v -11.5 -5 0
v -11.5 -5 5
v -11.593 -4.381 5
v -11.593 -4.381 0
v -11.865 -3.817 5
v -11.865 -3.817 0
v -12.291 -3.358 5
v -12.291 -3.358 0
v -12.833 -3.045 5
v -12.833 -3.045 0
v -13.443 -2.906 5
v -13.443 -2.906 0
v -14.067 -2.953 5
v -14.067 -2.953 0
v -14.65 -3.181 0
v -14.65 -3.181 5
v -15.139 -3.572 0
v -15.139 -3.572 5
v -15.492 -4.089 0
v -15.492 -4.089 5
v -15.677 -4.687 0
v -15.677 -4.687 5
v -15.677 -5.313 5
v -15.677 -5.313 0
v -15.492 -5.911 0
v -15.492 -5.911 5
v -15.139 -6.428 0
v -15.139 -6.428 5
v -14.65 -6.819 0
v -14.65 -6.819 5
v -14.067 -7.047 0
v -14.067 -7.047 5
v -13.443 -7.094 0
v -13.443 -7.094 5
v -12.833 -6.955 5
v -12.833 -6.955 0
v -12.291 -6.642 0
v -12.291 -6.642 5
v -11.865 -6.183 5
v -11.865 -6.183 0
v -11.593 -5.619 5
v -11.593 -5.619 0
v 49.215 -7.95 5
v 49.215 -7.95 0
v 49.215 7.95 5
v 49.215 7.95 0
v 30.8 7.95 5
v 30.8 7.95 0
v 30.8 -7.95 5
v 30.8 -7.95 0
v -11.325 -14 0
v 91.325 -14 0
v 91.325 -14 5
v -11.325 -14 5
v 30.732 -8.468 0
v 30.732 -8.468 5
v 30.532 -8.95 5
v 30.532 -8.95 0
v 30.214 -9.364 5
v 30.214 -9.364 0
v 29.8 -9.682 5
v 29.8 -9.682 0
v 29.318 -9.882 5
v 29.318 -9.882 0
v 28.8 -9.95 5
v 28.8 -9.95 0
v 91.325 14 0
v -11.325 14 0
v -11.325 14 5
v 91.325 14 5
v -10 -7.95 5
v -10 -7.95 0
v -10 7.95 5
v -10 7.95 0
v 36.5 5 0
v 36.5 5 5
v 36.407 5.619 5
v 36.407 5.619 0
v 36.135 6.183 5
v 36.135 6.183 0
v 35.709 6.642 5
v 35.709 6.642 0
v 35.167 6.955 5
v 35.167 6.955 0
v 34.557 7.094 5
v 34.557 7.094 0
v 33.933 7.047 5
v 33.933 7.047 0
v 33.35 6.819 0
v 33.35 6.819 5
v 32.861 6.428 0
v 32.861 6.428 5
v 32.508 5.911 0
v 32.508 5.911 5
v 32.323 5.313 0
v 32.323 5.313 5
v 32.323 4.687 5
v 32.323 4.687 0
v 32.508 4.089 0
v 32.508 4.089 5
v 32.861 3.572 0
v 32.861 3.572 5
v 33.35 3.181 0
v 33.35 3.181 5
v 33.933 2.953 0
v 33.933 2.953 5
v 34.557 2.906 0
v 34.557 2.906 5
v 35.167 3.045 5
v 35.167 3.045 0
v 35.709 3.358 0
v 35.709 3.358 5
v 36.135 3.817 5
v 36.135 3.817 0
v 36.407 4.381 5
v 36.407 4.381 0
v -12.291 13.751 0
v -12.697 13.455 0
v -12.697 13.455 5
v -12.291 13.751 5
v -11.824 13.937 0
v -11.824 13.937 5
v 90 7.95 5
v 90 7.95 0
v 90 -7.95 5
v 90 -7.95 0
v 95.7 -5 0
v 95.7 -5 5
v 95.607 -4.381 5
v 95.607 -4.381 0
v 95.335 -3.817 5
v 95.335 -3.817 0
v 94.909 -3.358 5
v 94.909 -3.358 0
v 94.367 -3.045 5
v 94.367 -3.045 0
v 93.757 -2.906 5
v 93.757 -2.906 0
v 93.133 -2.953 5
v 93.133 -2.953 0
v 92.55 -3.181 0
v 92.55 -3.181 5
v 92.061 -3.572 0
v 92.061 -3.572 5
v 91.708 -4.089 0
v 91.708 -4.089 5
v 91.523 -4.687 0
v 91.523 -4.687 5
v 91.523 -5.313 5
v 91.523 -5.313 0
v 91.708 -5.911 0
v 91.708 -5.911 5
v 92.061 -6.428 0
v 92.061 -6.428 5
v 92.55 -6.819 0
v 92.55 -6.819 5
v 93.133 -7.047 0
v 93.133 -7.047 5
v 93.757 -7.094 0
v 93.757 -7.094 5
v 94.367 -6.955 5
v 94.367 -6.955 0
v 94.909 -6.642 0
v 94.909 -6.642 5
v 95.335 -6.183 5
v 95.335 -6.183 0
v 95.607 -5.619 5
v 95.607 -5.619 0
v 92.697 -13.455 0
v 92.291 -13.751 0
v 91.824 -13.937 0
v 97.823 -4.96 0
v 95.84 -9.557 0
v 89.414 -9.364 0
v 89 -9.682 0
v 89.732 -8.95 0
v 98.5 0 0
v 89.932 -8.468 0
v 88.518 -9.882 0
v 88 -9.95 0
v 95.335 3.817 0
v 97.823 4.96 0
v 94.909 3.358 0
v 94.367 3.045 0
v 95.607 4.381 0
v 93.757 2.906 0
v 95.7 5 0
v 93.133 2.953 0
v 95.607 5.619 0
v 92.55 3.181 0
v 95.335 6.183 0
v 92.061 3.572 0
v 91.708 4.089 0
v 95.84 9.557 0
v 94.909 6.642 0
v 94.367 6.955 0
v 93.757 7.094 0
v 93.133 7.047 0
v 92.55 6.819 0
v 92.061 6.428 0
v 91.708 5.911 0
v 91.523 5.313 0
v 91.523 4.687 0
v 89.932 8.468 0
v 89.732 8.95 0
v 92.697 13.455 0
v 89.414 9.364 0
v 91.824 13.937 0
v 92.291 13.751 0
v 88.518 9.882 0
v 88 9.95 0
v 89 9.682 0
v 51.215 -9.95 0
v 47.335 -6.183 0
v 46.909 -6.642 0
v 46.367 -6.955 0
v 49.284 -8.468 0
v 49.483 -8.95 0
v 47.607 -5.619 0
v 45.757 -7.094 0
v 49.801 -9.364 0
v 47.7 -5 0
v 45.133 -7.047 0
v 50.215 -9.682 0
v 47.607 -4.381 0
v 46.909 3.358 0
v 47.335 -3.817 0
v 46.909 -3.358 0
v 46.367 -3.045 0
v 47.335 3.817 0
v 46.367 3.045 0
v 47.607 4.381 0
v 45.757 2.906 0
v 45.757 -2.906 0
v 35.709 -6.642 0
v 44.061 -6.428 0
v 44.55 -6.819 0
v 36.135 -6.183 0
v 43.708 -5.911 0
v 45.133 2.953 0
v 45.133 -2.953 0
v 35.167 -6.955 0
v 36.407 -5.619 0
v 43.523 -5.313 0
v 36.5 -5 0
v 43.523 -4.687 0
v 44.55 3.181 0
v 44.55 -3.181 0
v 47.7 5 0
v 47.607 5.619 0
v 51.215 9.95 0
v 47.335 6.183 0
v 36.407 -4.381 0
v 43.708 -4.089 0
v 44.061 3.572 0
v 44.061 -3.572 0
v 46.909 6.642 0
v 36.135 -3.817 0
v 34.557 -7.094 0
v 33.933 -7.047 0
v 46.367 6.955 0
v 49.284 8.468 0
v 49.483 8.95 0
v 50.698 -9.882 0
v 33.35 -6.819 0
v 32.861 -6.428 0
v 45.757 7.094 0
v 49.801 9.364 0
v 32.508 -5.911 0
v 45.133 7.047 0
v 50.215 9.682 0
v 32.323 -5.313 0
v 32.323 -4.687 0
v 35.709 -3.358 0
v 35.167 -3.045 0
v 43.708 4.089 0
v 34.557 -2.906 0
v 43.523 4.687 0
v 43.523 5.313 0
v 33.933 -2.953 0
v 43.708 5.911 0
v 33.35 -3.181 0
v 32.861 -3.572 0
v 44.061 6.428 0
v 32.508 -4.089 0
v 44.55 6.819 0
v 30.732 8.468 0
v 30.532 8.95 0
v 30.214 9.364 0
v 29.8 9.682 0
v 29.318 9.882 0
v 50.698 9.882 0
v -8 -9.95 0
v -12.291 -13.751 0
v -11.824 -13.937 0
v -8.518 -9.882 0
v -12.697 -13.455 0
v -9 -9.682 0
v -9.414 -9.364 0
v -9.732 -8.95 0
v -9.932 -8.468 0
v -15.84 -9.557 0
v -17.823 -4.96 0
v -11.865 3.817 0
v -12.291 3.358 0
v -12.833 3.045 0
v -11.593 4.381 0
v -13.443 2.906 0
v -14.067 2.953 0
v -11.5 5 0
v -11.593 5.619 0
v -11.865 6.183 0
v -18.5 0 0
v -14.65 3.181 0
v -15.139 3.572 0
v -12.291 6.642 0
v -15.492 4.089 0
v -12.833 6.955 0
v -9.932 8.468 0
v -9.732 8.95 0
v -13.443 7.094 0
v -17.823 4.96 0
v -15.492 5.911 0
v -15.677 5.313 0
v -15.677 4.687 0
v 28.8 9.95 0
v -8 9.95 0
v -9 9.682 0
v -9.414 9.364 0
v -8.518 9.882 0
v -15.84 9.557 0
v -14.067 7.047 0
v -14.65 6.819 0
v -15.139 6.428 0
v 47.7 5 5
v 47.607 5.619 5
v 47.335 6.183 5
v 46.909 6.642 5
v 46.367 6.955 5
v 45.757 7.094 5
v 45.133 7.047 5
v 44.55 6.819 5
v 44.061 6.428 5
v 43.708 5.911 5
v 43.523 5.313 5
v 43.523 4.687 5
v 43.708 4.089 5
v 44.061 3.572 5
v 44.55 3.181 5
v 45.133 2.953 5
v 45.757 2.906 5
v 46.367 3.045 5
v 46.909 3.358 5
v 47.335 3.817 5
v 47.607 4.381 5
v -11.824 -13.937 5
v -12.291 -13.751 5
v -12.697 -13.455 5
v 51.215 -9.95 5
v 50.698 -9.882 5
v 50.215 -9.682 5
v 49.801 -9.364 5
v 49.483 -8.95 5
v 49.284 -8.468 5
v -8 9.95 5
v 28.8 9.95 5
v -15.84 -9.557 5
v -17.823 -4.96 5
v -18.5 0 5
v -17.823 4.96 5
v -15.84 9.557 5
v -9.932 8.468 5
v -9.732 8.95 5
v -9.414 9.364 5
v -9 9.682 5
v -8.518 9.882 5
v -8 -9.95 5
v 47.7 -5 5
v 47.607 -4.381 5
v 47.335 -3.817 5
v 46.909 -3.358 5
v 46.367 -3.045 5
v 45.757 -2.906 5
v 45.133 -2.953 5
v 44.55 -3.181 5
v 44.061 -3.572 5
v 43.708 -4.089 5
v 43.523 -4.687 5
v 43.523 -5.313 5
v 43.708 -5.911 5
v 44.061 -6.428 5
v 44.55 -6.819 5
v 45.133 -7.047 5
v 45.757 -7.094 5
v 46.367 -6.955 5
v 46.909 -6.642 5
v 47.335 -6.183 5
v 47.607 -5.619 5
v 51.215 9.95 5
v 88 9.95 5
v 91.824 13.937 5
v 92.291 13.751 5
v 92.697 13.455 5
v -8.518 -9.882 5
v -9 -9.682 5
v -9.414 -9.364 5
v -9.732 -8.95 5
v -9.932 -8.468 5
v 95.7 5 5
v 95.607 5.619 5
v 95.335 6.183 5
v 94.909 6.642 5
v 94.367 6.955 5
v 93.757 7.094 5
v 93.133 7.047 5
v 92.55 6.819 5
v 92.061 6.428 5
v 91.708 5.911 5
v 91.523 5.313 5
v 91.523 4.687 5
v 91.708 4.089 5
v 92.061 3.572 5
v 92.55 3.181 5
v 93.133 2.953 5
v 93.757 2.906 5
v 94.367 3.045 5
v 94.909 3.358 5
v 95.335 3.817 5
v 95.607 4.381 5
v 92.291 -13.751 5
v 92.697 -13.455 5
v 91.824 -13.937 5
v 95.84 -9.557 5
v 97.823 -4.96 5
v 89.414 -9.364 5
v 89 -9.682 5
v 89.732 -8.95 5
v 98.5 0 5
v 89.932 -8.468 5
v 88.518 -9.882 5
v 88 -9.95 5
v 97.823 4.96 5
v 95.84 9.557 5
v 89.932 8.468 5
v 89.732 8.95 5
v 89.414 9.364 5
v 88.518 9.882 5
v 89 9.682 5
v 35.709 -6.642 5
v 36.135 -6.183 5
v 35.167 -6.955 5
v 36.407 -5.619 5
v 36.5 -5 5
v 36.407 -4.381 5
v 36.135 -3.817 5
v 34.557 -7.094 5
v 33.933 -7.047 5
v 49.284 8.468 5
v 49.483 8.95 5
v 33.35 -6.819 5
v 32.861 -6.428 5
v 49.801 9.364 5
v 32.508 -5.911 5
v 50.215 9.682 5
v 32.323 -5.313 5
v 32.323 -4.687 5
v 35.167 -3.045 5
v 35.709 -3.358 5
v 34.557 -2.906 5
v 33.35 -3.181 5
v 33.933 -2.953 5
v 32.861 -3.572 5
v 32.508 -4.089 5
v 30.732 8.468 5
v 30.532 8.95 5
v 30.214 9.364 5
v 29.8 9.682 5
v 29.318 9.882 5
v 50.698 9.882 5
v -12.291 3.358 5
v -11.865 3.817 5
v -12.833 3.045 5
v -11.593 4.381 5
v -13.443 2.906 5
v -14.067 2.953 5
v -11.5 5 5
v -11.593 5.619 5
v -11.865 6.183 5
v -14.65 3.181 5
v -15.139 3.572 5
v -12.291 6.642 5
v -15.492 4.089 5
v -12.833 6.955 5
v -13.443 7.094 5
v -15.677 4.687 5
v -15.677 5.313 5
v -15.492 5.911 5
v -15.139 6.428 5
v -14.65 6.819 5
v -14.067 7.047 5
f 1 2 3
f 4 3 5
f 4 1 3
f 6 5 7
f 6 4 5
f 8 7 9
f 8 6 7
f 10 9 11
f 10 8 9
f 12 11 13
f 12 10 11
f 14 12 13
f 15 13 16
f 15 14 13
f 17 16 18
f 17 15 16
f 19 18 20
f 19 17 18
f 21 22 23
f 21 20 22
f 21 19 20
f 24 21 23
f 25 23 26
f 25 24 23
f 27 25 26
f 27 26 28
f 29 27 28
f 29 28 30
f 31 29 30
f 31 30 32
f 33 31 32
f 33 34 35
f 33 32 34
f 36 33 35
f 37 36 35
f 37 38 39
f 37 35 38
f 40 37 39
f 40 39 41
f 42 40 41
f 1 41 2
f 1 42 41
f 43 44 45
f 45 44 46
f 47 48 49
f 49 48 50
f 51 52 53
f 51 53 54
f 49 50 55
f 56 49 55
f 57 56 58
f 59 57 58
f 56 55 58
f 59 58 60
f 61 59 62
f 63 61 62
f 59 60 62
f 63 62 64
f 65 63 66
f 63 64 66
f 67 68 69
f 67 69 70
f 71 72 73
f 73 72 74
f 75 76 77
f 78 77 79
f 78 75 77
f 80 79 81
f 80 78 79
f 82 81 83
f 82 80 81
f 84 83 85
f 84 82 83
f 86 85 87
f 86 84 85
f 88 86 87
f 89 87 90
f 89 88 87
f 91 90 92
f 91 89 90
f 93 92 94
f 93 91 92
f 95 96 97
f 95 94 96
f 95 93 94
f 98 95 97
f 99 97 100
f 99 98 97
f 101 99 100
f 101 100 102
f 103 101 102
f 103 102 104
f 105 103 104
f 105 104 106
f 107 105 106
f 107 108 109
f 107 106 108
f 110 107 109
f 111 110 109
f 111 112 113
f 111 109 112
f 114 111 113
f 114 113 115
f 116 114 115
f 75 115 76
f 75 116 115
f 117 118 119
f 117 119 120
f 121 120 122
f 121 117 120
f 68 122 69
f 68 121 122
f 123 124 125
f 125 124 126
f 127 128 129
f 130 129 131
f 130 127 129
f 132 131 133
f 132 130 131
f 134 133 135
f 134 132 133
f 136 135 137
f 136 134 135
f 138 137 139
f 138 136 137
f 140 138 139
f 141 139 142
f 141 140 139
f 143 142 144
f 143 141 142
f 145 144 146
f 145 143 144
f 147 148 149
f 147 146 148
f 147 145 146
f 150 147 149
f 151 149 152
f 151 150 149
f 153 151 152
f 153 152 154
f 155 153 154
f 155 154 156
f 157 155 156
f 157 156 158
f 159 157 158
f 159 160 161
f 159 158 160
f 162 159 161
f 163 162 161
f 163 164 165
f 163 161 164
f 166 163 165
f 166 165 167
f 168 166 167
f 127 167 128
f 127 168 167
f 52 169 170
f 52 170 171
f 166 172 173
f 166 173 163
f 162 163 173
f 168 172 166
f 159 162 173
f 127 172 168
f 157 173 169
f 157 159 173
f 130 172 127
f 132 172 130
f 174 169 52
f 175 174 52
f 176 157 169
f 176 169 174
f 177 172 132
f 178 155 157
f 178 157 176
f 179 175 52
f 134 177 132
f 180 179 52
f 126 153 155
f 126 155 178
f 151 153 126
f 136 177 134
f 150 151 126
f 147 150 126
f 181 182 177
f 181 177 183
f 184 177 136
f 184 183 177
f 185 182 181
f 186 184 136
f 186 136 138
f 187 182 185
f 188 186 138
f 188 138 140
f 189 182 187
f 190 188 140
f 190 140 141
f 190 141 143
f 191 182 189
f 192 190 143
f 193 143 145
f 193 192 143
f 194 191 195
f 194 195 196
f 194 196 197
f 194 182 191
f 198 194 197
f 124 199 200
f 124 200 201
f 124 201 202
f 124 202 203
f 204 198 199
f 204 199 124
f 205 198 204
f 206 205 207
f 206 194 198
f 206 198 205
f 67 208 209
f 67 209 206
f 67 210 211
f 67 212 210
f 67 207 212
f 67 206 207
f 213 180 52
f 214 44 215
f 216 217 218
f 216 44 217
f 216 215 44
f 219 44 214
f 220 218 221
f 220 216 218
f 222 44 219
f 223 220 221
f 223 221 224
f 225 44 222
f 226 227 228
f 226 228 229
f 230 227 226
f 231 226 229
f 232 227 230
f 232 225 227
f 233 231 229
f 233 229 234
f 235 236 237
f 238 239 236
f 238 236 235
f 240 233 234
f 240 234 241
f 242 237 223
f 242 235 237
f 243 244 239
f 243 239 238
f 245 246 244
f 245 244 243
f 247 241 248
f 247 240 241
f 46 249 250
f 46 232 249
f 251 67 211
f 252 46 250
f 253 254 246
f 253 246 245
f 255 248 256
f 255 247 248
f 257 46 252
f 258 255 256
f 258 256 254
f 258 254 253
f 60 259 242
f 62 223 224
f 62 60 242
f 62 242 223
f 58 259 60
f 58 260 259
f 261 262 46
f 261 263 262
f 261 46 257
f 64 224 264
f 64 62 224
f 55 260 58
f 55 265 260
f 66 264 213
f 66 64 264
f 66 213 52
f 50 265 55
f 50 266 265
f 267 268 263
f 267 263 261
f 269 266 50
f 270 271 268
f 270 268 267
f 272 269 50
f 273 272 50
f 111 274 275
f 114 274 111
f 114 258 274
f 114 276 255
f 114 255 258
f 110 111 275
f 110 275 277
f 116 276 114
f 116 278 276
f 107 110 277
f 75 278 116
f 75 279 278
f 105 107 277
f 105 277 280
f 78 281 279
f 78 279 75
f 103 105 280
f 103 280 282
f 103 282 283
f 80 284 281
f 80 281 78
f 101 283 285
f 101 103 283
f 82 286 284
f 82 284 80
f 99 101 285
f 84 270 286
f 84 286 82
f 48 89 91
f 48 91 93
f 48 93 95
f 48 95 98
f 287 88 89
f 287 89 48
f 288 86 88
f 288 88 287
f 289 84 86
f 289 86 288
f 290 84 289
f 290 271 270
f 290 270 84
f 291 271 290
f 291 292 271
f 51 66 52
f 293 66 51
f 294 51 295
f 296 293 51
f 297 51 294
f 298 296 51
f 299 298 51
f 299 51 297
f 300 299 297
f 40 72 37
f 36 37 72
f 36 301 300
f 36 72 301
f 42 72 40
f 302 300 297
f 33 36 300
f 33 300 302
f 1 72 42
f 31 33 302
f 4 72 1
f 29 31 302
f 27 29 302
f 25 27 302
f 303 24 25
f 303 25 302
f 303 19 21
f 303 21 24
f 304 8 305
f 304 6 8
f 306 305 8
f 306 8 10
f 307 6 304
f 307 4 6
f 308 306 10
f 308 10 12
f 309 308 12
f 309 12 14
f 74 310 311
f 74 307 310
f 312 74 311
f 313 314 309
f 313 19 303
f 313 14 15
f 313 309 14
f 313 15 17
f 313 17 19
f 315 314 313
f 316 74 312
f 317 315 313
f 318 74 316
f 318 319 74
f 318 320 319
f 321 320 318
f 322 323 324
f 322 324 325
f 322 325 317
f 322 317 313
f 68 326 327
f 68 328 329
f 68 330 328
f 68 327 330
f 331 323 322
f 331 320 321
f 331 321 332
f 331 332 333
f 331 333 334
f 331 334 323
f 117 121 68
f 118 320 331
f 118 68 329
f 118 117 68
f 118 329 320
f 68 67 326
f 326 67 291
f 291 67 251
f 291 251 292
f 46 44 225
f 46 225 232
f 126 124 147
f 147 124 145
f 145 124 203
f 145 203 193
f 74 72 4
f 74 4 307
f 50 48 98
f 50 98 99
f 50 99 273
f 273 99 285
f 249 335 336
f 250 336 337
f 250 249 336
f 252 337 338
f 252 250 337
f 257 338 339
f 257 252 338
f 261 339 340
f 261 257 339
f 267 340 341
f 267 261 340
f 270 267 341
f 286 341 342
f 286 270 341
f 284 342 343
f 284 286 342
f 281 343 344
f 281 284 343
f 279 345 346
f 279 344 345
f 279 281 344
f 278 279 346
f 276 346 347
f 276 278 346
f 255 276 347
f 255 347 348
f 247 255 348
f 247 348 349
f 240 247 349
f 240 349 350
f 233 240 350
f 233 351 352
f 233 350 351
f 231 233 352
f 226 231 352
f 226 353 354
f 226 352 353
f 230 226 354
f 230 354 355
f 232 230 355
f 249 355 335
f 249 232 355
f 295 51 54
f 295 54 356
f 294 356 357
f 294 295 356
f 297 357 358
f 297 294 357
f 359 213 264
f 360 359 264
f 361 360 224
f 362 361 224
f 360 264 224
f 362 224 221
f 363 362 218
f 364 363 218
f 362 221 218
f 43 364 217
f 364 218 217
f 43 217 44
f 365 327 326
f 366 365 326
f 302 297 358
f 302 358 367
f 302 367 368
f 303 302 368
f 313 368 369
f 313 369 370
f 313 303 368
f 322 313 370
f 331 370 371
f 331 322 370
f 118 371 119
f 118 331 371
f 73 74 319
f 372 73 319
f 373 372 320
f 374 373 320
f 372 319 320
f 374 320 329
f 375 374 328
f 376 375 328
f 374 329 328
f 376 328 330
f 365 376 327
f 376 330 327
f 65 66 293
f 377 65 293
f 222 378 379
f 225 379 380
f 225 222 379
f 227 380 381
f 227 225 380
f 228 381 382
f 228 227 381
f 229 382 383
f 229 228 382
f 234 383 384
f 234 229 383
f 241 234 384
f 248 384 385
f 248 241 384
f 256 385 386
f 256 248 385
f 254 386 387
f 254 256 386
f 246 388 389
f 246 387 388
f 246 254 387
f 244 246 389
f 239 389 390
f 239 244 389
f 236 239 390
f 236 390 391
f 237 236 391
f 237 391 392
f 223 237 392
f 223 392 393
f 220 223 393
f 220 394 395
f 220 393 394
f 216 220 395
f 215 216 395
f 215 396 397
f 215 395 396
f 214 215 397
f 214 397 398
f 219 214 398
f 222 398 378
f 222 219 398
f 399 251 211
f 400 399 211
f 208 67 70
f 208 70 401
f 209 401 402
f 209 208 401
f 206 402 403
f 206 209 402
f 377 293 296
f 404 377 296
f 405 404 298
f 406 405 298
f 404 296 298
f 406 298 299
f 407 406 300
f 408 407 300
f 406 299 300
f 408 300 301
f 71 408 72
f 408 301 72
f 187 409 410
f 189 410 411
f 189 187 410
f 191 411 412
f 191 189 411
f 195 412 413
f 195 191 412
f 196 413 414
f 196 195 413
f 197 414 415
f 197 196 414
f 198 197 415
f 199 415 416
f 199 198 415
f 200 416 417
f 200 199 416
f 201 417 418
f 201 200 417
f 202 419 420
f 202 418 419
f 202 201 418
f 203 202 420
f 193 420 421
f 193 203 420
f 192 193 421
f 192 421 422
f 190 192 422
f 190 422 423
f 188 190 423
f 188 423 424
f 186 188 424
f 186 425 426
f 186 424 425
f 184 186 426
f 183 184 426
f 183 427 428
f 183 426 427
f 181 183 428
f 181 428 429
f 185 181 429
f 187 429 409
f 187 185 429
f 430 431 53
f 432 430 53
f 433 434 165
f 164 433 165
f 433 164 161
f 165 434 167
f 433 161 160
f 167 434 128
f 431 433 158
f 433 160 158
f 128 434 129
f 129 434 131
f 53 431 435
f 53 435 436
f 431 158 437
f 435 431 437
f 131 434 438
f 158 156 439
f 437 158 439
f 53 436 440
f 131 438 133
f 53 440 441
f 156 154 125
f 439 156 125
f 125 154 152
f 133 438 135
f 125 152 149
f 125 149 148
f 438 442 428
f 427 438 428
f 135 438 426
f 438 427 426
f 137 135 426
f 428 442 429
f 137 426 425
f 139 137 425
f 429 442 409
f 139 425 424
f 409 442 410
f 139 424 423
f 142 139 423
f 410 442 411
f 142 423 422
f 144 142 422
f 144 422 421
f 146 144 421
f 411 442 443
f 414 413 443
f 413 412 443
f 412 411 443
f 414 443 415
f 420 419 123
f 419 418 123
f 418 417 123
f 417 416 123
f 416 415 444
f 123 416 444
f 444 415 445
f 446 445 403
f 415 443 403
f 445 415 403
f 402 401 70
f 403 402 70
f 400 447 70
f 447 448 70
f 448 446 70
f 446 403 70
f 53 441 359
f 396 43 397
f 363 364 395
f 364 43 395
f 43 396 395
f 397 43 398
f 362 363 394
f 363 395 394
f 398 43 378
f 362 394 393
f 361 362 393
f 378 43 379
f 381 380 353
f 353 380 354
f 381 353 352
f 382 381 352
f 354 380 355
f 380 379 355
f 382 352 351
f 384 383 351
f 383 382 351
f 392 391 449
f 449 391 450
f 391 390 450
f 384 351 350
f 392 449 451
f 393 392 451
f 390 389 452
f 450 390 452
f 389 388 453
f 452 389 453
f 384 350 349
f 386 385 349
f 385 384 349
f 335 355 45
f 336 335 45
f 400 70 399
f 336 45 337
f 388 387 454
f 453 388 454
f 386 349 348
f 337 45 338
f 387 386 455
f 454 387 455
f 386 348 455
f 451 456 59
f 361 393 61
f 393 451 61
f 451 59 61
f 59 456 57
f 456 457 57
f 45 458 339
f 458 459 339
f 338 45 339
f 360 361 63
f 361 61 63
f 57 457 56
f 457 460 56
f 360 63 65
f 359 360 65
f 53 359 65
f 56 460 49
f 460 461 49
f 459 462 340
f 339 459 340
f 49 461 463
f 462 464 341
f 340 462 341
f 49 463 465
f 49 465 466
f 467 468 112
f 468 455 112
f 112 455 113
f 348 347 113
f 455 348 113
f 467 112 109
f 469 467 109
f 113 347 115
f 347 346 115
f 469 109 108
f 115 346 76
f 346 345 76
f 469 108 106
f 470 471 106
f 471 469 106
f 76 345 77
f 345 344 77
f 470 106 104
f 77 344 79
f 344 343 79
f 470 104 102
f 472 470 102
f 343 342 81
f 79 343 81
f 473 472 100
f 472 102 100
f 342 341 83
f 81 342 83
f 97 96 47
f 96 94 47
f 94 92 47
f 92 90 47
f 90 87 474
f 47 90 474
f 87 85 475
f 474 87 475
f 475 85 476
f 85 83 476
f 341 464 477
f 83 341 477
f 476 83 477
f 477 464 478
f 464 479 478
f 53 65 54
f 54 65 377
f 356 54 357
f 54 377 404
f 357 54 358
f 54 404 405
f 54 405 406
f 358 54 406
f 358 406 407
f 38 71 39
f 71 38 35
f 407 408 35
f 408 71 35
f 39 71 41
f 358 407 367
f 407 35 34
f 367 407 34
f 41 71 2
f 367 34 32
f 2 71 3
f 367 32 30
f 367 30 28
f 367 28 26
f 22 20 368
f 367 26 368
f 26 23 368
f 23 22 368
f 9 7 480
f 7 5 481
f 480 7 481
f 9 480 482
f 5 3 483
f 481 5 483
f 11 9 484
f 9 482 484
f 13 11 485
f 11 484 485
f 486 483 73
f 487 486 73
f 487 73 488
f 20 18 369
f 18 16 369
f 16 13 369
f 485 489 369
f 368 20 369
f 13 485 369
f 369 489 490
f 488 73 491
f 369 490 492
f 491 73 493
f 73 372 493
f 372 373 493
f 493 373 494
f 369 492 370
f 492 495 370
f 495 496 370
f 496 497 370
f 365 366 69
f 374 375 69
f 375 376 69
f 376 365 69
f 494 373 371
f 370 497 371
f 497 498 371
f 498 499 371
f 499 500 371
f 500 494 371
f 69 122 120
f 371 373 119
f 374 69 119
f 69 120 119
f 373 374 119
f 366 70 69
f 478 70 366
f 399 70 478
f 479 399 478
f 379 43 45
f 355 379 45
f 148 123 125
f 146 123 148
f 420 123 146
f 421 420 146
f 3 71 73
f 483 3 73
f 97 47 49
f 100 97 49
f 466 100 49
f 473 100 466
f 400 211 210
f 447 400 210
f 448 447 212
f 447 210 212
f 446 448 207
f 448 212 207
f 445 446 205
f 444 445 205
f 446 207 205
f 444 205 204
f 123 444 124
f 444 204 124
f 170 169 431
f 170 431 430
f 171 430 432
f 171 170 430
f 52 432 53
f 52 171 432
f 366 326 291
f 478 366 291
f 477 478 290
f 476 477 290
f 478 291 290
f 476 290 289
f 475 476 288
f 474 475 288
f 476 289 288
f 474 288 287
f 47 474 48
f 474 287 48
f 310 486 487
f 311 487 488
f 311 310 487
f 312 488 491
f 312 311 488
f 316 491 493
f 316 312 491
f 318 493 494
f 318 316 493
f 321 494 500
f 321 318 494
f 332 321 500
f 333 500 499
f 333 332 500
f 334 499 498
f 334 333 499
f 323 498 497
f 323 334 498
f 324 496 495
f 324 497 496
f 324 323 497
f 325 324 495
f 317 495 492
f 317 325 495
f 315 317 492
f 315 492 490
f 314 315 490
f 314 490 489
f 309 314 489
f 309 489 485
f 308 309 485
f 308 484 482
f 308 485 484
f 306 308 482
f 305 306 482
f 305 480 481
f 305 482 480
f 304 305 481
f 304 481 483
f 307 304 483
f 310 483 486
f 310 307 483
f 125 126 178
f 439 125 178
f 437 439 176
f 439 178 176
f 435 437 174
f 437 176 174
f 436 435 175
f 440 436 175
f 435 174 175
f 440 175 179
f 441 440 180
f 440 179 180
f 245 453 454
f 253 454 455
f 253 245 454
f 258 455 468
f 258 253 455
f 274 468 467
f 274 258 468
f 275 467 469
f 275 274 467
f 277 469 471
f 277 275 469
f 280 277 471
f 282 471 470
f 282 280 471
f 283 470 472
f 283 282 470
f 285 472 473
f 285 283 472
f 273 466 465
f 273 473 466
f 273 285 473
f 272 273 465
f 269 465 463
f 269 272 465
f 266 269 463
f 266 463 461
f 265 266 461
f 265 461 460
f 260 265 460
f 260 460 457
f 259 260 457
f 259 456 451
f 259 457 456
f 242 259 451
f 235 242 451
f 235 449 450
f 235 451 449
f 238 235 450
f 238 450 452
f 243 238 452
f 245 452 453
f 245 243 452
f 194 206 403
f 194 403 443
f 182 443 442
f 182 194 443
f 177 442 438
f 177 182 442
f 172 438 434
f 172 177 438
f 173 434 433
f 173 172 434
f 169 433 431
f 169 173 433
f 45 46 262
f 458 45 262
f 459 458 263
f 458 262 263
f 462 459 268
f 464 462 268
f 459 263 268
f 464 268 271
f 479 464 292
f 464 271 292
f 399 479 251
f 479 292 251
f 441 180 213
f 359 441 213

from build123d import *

# Parameters (mm, degrees)
EXTRUSION1_DEPTH        = 5
ESQUISSE2_R             = 2.1
ENL_V_MAT_EXTRU_1_DEPTH = 100.61551084


with BuildPart() as part:
    # Esquisse1 → Extrusion1 (new body)
    with BuildSketch(Plane.XY):
        with BuildLine():
            Line((-11.324751653, 14), (91.324751653, 14))
            ThreePointArc((91.324751653, 14), (92.063300599, 13.858640755), (92.697448823, 13.454545455))
            ThreePointArc((92.697448823, 13.454545455), (98.5, 0), (92.697448823, -13.454545455))
            ThreePointArc((92.697448823, -13.454545455), (92.063300599, -13.858640755), (91.324751653, -14))
            Line((91.324751653, -14), (-11.324751653, -14))
            ThreePointArc((-11.324751653, -14), (-12.063300599, -13.858640755), (-12.697448823, -13.454545455))
            ThreePointArc((-12.697448823, -13.454545455), (-18.5, 0), (-12.697448823, 13.454545455))
            ThreePointArc((-12.697448823, 13.454545455), (-12.063300599, 13.858640755), (-11.324751653, 14))
        make_face()
        with BuildLine():
            Line((51.215395011, 9.95), (88, 9.95))
            ThreePointArc((88, 9.95), (89.414213562, 9.364213562), (90, 7.95))
            Line((90, 7.95), (90, -7.95))
            ThreePointArc((90, -7.95), (89.414213562, -9.364213562), (88, -9.95))
            Line((88, -9.95), (51.215395011, -9.95))
            ThreePointArc((51.215395011, -9.95), (49.801181448, -9.364213562), (49.215395011, -7.95))
            Line((49.215395011, -7.95), (49.215395011, 7.95))
            ThreePointArc((49.215395011, 7.95), (49.801181448, 9.364213562), (51.215395011, 9.95))
        make_face(mode=Mode.SUBTRACT)
        with BuildLine():
            Line((-8, 9.95), (28.8, 9.95))
            ThreePointArc((28.8, 9.95), (30.214213562, 9.364213562), (30.8, 7.95))
            Line((30.8, 7.95), (30.8, -7.95))
            ThreePointArc((30.8, -7.95), (30.214213562, -9.364213562), (28.8, -9.95))
            Line((28.8, -9.95), (-8, -9.95))
            ThreePointArc((-8, -9.95), (-9.414213562, -9.364213562), (-10, -7.95))
            Line((-10, -7.95), (-10, 7.95))
            ThreePointArc((-10, 7.95), (-9.414213562, 9.364213562), (-8, 9.95))
        make_face(mode=Mode.SUBTRACT)
    extrude(amount=EXTRUSION1_DEPTH)

    # Esquisse2 → Enlèv. mat.-Extru.1 (cut, through all)
    with BuildSketch(Plane.XY):
        with Locations((-13.6, 5)):
            Circle(ESQUISSE2_R)
        with Locations((45.6, -5)):
            Circle(ESQUISSE2_R)
        with Locations((34.4, 5)):
            Circle(ESQUISSE2_R)
        with Locations((-13.6, -5)):
            Circle(ESQUISSE2_R)
        with Locations((93.6, 5)):
            Circle(ESQUISSE2_R)
        with Locations((93.6, -5)):
            Circle(ESQUISSE2_R)
        with Locations((45.6, 5)):
            Circle(ESQUISSE2_R)
        with Locations((34.4, -5)):
            Circle(ESQUISSE2_R)
    extrude(amount=ENL_V_MAT_EXTRU_1_DEPTH, mode=Mode.SUBTRACT)


solid = part.part
